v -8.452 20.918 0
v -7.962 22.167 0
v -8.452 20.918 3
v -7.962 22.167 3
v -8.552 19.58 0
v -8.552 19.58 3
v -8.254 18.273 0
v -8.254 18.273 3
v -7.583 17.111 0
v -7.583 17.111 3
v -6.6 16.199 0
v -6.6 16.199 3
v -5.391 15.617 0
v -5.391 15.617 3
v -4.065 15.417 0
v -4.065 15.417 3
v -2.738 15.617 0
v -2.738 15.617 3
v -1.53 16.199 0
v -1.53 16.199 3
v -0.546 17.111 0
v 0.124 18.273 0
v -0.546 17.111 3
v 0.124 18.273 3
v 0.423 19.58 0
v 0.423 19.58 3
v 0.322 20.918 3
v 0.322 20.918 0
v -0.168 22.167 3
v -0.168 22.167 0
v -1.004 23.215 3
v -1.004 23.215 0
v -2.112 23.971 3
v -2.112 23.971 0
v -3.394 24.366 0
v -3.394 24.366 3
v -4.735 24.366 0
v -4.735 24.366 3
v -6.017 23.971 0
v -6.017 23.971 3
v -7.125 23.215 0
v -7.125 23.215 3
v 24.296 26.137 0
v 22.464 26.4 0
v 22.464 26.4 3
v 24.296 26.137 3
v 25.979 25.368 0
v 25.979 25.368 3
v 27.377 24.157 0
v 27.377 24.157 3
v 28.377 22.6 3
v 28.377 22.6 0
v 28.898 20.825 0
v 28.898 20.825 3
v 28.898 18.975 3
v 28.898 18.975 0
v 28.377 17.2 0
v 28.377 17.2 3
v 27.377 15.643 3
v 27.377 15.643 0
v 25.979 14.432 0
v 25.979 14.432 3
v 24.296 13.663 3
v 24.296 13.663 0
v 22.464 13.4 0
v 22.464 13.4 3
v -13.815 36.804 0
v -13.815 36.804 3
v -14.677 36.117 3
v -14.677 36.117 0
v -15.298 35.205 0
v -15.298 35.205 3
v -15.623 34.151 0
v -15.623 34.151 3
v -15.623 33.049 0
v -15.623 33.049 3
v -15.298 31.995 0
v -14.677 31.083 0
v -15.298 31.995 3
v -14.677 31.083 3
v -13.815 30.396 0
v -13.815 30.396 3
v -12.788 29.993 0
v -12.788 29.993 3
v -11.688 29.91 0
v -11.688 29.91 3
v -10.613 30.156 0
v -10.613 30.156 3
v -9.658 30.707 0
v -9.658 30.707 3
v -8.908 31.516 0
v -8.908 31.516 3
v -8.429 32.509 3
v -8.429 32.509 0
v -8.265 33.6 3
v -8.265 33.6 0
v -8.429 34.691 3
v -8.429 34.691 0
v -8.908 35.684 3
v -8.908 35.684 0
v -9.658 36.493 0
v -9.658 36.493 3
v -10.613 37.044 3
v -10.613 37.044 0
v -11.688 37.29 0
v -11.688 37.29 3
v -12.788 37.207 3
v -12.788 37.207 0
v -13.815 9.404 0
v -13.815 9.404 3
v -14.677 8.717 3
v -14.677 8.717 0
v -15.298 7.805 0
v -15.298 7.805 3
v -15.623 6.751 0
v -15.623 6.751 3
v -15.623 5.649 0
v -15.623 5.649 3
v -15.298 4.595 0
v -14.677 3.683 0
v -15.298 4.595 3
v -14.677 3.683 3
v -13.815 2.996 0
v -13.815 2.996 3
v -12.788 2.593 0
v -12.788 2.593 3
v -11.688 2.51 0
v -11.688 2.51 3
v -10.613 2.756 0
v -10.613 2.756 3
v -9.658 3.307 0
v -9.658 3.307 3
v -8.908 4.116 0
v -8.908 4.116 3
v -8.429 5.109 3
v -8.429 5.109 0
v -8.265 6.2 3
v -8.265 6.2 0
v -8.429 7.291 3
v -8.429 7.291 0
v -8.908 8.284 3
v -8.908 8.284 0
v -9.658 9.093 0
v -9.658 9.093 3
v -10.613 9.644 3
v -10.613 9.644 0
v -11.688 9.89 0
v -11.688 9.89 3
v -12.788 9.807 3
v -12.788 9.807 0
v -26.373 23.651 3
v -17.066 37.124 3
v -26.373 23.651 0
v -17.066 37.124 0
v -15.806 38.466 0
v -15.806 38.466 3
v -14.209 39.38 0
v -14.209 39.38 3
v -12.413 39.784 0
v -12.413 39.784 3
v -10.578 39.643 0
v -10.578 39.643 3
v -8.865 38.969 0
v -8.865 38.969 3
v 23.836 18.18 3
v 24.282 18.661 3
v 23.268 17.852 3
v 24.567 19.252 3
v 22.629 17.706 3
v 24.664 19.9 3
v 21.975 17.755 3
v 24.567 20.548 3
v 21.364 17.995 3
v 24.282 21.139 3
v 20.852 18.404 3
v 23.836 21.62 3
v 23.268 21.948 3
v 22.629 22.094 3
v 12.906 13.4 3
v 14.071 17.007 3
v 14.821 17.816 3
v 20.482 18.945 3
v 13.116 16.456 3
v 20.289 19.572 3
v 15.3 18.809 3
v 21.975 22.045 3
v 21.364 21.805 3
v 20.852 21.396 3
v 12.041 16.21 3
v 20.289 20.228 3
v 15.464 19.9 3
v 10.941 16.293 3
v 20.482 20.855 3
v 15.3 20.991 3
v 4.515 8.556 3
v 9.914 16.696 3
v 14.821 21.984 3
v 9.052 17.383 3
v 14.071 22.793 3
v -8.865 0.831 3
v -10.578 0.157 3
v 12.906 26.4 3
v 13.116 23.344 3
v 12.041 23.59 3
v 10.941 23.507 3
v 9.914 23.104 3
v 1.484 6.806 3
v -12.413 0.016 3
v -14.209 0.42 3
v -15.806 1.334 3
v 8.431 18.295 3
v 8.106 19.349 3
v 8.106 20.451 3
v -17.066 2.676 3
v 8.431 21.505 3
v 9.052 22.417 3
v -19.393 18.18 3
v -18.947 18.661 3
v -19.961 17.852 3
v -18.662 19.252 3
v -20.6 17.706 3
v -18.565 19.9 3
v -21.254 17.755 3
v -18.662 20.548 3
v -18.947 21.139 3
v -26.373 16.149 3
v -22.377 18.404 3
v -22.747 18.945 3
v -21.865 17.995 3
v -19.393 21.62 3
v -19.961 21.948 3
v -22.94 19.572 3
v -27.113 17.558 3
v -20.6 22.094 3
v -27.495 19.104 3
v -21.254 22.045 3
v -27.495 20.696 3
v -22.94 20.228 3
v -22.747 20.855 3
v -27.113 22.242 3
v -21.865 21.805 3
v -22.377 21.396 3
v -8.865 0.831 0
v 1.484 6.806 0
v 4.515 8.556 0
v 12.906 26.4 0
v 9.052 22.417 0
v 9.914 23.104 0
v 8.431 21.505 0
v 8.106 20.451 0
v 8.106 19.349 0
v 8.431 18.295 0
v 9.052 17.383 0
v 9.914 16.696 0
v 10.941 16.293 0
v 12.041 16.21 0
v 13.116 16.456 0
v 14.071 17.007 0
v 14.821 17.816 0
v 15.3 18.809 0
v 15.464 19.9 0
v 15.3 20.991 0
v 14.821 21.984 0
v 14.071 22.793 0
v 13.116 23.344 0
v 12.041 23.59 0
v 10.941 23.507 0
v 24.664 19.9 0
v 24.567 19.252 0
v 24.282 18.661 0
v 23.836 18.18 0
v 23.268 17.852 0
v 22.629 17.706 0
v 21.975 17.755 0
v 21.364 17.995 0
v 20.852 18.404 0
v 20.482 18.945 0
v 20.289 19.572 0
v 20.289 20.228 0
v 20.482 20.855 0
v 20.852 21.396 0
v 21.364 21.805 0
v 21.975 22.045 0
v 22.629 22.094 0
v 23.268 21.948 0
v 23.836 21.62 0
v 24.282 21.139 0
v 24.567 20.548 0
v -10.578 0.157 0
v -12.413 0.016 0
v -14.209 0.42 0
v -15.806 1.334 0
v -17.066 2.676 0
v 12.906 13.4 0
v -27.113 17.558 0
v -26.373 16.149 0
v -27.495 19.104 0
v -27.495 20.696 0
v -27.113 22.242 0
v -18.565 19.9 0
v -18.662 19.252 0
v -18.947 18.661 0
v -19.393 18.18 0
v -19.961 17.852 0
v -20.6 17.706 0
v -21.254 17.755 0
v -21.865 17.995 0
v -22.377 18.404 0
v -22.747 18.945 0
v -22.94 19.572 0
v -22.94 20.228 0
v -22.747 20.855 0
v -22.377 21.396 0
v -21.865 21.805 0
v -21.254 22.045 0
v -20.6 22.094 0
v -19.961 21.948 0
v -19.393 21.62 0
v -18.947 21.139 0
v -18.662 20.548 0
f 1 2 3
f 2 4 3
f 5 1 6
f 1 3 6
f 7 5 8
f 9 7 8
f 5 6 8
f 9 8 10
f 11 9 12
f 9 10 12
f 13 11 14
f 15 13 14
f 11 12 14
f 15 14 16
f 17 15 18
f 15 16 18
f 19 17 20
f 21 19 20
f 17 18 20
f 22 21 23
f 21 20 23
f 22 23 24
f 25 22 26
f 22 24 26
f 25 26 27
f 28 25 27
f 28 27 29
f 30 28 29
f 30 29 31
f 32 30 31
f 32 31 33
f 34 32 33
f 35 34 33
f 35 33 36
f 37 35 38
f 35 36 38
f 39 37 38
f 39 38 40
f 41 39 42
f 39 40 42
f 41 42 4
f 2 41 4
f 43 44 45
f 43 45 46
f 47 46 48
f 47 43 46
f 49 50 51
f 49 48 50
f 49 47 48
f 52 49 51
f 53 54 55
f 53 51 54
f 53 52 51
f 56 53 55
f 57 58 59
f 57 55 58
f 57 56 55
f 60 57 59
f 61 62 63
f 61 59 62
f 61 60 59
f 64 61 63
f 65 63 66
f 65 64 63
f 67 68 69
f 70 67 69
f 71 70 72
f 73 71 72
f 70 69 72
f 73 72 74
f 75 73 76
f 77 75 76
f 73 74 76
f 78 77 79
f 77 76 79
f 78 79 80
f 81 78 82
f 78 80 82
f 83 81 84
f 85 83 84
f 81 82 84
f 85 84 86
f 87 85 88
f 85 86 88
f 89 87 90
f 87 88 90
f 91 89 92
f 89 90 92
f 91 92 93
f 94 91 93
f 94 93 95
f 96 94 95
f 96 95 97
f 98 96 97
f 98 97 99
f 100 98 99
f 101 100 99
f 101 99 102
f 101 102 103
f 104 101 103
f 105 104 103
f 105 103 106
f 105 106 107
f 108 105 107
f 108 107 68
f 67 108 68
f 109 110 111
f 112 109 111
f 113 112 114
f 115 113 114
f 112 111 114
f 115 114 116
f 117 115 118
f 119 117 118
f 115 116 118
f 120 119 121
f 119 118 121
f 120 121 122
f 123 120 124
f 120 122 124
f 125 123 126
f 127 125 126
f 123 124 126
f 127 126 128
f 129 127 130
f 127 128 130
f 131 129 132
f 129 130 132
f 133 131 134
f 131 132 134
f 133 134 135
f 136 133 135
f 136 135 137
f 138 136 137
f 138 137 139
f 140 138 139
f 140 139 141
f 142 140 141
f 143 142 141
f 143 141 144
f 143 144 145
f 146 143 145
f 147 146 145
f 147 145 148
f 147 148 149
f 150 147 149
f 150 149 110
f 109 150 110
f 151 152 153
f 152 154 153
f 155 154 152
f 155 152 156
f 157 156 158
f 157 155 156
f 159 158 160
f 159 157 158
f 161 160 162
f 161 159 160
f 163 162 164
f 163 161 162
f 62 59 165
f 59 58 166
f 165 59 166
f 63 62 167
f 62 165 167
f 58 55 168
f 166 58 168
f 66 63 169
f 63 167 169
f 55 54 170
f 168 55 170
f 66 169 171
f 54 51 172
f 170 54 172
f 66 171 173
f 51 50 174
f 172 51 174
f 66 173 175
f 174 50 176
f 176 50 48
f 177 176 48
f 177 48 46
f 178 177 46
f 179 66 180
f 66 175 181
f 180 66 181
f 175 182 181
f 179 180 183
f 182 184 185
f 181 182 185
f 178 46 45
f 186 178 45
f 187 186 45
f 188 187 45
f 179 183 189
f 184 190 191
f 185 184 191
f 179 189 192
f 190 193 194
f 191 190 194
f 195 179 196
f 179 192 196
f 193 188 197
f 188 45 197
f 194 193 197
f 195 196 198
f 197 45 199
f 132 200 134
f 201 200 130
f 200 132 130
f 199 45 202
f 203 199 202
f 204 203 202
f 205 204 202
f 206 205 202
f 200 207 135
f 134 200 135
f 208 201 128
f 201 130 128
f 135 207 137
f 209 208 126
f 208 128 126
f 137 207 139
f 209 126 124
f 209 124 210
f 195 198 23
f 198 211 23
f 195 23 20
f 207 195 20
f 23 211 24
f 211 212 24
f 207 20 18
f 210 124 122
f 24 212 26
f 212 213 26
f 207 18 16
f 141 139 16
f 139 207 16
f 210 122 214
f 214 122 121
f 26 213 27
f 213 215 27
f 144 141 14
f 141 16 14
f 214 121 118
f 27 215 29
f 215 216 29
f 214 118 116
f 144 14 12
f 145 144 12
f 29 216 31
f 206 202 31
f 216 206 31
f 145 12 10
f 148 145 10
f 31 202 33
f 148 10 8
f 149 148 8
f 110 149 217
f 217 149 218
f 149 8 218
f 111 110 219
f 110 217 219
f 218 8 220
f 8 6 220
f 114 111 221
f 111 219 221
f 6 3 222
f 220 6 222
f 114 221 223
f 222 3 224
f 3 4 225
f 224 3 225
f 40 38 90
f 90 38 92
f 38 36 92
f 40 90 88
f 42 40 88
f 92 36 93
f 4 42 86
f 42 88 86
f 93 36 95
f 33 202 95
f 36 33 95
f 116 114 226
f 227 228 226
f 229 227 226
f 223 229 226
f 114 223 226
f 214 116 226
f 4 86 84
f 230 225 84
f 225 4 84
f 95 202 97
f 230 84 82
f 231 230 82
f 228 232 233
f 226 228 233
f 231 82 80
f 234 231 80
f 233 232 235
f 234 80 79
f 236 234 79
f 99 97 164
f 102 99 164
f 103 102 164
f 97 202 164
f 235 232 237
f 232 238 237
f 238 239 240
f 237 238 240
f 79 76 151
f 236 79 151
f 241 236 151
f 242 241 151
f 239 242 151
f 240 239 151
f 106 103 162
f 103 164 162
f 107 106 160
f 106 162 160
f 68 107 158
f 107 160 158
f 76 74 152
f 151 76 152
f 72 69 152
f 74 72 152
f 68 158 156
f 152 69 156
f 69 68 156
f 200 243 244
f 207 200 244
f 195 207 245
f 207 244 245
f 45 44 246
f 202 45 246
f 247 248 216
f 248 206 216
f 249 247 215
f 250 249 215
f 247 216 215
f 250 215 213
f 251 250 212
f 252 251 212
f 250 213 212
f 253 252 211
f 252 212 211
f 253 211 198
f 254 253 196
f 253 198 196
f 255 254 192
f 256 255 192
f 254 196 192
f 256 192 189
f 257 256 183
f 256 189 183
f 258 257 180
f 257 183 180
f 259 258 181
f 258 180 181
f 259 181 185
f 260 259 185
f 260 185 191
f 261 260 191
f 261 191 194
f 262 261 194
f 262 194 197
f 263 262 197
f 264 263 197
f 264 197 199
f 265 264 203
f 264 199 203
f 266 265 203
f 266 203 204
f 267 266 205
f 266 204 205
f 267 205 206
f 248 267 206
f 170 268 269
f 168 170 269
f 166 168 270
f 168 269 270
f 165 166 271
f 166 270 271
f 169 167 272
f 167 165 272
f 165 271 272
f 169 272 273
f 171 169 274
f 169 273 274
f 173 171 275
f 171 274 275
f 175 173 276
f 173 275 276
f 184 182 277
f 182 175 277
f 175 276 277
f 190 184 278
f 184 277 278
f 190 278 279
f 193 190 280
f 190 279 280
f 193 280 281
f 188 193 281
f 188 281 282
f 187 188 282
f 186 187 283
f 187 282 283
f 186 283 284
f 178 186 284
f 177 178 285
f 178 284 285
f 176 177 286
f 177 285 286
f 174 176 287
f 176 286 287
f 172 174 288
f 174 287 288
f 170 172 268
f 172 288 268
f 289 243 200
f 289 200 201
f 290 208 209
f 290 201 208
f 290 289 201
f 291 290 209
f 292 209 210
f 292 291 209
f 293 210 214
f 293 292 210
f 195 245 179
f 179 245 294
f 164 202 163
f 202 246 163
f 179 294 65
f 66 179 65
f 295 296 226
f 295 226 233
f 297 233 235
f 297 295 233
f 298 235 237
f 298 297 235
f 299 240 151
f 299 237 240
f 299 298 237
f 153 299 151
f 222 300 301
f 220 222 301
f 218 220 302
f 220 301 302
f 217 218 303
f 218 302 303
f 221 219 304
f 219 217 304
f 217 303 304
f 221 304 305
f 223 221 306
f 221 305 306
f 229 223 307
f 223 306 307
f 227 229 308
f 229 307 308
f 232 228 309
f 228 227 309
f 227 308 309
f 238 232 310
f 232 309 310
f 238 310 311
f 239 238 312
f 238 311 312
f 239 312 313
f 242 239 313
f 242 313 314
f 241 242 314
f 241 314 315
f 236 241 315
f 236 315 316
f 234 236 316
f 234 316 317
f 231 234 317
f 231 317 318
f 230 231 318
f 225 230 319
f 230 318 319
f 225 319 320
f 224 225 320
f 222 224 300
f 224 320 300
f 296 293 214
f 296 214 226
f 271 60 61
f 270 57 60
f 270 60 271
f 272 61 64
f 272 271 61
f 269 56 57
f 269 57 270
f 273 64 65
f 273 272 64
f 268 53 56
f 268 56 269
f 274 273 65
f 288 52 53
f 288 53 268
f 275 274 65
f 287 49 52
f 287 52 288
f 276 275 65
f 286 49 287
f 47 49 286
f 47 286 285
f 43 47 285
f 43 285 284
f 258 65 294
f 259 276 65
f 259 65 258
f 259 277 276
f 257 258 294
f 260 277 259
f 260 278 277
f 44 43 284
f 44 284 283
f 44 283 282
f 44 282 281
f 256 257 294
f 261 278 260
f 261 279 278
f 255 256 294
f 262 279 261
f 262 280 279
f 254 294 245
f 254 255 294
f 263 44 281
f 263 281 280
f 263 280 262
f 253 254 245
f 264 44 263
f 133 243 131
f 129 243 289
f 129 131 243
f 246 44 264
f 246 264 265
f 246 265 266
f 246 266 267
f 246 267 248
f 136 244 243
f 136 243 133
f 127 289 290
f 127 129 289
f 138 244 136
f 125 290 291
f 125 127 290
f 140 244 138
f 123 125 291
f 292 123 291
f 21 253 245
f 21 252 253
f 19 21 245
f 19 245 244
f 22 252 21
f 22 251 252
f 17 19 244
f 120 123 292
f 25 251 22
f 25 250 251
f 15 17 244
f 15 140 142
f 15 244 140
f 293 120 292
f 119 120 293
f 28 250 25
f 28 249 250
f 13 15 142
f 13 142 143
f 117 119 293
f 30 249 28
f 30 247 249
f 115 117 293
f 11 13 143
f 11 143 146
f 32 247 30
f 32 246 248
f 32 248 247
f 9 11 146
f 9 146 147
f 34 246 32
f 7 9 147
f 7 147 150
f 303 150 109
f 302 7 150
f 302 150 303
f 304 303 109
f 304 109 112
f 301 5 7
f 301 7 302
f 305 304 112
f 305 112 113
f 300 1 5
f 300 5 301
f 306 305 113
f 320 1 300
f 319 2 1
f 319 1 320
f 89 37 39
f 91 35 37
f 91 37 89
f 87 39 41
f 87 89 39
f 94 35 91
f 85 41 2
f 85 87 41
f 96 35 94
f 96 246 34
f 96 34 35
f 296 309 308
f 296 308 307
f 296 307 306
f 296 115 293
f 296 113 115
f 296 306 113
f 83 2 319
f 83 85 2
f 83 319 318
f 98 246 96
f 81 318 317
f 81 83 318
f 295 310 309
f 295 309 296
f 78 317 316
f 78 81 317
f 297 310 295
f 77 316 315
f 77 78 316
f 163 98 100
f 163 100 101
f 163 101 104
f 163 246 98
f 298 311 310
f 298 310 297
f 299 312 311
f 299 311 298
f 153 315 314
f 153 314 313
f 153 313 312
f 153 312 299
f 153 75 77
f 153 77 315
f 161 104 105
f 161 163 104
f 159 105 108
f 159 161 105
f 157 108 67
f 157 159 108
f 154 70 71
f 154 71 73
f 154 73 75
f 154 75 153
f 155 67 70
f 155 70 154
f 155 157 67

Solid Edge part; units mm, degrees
sketch "Sketch1" plane through (0, 0, 0) normal (0, 0, 1) x (1, 0, 0)
  line L0 (-17.0658, 2.676) -> (-26.3732, 16.1486)
  arc A0 (-26.3732, 23.6514) -> (-26.3732, 16.1486) centre (-20.9429, 19.9) ccw
  line L1 (-17.0658, 37.124) -> (-26.3732, 23.6514)
  arc A1 (-17.0658, 37.124) -> (-8.8647, 38.9694) centre (-11.9647, 33.6) cw
  line L2 (12.906, 26.4) -> (-8.8647, 38.9694)
  line L3 (22.4644, 26.4) -> (12.906, 26.4)
  arc A2 (22.4644, 13.4) -> (22.4644, 26.4) centre (22.4644, 19.9) ccw
  line L4 (12.906, 13.4) -> (22.4644, 13.4)
  line L5 (4.5154, 8.5556) -> (12.906, 13.4)
  line L6 (1.4843, 6.8056) -> (4.5154, 8.5556)
  line L7 (-8.8647, 0.8306) -> (1.4843, 6.8056)
  arc A3 (-17.0658, 2.676) -> (-8.8647, 0.8306) centre (-11.9647, 6.2) ccw
  circle A4 centre (-20.7647, 19.9) radius 2.2
  circle A5 centre (22.4644, 19.9) radius 2.2
extrude "Protrusion1" add sketch "Sketch1" along normal blind 3
sketch "Sketch2" plane through (-1.5893, 19.9, 3) normal (0, 0, 1) x (-0.5, 0.866, 0)
  circle A0 centre (-6.6768, 15.8354) radius 3.7
  circle A1 centre (17.0523, 2.1354) radius 3.7
  circle A2 centre (-6.6768, -11.5646) radius 3.7
extrude "ExtrudedCutout_1" cut sketch "Sketch2" against normal blind 80.9131
sketch "Sketch3" plane through (0.7107, 19.9, 3) normal (0, 0, 1) x (-0.866, 0.5, 0)
  circle A0 centre (4.144, 2.3732) radius 4.5
extrude "Cutout1" cut sketch "Sketch3" against normal blind 107.7727
